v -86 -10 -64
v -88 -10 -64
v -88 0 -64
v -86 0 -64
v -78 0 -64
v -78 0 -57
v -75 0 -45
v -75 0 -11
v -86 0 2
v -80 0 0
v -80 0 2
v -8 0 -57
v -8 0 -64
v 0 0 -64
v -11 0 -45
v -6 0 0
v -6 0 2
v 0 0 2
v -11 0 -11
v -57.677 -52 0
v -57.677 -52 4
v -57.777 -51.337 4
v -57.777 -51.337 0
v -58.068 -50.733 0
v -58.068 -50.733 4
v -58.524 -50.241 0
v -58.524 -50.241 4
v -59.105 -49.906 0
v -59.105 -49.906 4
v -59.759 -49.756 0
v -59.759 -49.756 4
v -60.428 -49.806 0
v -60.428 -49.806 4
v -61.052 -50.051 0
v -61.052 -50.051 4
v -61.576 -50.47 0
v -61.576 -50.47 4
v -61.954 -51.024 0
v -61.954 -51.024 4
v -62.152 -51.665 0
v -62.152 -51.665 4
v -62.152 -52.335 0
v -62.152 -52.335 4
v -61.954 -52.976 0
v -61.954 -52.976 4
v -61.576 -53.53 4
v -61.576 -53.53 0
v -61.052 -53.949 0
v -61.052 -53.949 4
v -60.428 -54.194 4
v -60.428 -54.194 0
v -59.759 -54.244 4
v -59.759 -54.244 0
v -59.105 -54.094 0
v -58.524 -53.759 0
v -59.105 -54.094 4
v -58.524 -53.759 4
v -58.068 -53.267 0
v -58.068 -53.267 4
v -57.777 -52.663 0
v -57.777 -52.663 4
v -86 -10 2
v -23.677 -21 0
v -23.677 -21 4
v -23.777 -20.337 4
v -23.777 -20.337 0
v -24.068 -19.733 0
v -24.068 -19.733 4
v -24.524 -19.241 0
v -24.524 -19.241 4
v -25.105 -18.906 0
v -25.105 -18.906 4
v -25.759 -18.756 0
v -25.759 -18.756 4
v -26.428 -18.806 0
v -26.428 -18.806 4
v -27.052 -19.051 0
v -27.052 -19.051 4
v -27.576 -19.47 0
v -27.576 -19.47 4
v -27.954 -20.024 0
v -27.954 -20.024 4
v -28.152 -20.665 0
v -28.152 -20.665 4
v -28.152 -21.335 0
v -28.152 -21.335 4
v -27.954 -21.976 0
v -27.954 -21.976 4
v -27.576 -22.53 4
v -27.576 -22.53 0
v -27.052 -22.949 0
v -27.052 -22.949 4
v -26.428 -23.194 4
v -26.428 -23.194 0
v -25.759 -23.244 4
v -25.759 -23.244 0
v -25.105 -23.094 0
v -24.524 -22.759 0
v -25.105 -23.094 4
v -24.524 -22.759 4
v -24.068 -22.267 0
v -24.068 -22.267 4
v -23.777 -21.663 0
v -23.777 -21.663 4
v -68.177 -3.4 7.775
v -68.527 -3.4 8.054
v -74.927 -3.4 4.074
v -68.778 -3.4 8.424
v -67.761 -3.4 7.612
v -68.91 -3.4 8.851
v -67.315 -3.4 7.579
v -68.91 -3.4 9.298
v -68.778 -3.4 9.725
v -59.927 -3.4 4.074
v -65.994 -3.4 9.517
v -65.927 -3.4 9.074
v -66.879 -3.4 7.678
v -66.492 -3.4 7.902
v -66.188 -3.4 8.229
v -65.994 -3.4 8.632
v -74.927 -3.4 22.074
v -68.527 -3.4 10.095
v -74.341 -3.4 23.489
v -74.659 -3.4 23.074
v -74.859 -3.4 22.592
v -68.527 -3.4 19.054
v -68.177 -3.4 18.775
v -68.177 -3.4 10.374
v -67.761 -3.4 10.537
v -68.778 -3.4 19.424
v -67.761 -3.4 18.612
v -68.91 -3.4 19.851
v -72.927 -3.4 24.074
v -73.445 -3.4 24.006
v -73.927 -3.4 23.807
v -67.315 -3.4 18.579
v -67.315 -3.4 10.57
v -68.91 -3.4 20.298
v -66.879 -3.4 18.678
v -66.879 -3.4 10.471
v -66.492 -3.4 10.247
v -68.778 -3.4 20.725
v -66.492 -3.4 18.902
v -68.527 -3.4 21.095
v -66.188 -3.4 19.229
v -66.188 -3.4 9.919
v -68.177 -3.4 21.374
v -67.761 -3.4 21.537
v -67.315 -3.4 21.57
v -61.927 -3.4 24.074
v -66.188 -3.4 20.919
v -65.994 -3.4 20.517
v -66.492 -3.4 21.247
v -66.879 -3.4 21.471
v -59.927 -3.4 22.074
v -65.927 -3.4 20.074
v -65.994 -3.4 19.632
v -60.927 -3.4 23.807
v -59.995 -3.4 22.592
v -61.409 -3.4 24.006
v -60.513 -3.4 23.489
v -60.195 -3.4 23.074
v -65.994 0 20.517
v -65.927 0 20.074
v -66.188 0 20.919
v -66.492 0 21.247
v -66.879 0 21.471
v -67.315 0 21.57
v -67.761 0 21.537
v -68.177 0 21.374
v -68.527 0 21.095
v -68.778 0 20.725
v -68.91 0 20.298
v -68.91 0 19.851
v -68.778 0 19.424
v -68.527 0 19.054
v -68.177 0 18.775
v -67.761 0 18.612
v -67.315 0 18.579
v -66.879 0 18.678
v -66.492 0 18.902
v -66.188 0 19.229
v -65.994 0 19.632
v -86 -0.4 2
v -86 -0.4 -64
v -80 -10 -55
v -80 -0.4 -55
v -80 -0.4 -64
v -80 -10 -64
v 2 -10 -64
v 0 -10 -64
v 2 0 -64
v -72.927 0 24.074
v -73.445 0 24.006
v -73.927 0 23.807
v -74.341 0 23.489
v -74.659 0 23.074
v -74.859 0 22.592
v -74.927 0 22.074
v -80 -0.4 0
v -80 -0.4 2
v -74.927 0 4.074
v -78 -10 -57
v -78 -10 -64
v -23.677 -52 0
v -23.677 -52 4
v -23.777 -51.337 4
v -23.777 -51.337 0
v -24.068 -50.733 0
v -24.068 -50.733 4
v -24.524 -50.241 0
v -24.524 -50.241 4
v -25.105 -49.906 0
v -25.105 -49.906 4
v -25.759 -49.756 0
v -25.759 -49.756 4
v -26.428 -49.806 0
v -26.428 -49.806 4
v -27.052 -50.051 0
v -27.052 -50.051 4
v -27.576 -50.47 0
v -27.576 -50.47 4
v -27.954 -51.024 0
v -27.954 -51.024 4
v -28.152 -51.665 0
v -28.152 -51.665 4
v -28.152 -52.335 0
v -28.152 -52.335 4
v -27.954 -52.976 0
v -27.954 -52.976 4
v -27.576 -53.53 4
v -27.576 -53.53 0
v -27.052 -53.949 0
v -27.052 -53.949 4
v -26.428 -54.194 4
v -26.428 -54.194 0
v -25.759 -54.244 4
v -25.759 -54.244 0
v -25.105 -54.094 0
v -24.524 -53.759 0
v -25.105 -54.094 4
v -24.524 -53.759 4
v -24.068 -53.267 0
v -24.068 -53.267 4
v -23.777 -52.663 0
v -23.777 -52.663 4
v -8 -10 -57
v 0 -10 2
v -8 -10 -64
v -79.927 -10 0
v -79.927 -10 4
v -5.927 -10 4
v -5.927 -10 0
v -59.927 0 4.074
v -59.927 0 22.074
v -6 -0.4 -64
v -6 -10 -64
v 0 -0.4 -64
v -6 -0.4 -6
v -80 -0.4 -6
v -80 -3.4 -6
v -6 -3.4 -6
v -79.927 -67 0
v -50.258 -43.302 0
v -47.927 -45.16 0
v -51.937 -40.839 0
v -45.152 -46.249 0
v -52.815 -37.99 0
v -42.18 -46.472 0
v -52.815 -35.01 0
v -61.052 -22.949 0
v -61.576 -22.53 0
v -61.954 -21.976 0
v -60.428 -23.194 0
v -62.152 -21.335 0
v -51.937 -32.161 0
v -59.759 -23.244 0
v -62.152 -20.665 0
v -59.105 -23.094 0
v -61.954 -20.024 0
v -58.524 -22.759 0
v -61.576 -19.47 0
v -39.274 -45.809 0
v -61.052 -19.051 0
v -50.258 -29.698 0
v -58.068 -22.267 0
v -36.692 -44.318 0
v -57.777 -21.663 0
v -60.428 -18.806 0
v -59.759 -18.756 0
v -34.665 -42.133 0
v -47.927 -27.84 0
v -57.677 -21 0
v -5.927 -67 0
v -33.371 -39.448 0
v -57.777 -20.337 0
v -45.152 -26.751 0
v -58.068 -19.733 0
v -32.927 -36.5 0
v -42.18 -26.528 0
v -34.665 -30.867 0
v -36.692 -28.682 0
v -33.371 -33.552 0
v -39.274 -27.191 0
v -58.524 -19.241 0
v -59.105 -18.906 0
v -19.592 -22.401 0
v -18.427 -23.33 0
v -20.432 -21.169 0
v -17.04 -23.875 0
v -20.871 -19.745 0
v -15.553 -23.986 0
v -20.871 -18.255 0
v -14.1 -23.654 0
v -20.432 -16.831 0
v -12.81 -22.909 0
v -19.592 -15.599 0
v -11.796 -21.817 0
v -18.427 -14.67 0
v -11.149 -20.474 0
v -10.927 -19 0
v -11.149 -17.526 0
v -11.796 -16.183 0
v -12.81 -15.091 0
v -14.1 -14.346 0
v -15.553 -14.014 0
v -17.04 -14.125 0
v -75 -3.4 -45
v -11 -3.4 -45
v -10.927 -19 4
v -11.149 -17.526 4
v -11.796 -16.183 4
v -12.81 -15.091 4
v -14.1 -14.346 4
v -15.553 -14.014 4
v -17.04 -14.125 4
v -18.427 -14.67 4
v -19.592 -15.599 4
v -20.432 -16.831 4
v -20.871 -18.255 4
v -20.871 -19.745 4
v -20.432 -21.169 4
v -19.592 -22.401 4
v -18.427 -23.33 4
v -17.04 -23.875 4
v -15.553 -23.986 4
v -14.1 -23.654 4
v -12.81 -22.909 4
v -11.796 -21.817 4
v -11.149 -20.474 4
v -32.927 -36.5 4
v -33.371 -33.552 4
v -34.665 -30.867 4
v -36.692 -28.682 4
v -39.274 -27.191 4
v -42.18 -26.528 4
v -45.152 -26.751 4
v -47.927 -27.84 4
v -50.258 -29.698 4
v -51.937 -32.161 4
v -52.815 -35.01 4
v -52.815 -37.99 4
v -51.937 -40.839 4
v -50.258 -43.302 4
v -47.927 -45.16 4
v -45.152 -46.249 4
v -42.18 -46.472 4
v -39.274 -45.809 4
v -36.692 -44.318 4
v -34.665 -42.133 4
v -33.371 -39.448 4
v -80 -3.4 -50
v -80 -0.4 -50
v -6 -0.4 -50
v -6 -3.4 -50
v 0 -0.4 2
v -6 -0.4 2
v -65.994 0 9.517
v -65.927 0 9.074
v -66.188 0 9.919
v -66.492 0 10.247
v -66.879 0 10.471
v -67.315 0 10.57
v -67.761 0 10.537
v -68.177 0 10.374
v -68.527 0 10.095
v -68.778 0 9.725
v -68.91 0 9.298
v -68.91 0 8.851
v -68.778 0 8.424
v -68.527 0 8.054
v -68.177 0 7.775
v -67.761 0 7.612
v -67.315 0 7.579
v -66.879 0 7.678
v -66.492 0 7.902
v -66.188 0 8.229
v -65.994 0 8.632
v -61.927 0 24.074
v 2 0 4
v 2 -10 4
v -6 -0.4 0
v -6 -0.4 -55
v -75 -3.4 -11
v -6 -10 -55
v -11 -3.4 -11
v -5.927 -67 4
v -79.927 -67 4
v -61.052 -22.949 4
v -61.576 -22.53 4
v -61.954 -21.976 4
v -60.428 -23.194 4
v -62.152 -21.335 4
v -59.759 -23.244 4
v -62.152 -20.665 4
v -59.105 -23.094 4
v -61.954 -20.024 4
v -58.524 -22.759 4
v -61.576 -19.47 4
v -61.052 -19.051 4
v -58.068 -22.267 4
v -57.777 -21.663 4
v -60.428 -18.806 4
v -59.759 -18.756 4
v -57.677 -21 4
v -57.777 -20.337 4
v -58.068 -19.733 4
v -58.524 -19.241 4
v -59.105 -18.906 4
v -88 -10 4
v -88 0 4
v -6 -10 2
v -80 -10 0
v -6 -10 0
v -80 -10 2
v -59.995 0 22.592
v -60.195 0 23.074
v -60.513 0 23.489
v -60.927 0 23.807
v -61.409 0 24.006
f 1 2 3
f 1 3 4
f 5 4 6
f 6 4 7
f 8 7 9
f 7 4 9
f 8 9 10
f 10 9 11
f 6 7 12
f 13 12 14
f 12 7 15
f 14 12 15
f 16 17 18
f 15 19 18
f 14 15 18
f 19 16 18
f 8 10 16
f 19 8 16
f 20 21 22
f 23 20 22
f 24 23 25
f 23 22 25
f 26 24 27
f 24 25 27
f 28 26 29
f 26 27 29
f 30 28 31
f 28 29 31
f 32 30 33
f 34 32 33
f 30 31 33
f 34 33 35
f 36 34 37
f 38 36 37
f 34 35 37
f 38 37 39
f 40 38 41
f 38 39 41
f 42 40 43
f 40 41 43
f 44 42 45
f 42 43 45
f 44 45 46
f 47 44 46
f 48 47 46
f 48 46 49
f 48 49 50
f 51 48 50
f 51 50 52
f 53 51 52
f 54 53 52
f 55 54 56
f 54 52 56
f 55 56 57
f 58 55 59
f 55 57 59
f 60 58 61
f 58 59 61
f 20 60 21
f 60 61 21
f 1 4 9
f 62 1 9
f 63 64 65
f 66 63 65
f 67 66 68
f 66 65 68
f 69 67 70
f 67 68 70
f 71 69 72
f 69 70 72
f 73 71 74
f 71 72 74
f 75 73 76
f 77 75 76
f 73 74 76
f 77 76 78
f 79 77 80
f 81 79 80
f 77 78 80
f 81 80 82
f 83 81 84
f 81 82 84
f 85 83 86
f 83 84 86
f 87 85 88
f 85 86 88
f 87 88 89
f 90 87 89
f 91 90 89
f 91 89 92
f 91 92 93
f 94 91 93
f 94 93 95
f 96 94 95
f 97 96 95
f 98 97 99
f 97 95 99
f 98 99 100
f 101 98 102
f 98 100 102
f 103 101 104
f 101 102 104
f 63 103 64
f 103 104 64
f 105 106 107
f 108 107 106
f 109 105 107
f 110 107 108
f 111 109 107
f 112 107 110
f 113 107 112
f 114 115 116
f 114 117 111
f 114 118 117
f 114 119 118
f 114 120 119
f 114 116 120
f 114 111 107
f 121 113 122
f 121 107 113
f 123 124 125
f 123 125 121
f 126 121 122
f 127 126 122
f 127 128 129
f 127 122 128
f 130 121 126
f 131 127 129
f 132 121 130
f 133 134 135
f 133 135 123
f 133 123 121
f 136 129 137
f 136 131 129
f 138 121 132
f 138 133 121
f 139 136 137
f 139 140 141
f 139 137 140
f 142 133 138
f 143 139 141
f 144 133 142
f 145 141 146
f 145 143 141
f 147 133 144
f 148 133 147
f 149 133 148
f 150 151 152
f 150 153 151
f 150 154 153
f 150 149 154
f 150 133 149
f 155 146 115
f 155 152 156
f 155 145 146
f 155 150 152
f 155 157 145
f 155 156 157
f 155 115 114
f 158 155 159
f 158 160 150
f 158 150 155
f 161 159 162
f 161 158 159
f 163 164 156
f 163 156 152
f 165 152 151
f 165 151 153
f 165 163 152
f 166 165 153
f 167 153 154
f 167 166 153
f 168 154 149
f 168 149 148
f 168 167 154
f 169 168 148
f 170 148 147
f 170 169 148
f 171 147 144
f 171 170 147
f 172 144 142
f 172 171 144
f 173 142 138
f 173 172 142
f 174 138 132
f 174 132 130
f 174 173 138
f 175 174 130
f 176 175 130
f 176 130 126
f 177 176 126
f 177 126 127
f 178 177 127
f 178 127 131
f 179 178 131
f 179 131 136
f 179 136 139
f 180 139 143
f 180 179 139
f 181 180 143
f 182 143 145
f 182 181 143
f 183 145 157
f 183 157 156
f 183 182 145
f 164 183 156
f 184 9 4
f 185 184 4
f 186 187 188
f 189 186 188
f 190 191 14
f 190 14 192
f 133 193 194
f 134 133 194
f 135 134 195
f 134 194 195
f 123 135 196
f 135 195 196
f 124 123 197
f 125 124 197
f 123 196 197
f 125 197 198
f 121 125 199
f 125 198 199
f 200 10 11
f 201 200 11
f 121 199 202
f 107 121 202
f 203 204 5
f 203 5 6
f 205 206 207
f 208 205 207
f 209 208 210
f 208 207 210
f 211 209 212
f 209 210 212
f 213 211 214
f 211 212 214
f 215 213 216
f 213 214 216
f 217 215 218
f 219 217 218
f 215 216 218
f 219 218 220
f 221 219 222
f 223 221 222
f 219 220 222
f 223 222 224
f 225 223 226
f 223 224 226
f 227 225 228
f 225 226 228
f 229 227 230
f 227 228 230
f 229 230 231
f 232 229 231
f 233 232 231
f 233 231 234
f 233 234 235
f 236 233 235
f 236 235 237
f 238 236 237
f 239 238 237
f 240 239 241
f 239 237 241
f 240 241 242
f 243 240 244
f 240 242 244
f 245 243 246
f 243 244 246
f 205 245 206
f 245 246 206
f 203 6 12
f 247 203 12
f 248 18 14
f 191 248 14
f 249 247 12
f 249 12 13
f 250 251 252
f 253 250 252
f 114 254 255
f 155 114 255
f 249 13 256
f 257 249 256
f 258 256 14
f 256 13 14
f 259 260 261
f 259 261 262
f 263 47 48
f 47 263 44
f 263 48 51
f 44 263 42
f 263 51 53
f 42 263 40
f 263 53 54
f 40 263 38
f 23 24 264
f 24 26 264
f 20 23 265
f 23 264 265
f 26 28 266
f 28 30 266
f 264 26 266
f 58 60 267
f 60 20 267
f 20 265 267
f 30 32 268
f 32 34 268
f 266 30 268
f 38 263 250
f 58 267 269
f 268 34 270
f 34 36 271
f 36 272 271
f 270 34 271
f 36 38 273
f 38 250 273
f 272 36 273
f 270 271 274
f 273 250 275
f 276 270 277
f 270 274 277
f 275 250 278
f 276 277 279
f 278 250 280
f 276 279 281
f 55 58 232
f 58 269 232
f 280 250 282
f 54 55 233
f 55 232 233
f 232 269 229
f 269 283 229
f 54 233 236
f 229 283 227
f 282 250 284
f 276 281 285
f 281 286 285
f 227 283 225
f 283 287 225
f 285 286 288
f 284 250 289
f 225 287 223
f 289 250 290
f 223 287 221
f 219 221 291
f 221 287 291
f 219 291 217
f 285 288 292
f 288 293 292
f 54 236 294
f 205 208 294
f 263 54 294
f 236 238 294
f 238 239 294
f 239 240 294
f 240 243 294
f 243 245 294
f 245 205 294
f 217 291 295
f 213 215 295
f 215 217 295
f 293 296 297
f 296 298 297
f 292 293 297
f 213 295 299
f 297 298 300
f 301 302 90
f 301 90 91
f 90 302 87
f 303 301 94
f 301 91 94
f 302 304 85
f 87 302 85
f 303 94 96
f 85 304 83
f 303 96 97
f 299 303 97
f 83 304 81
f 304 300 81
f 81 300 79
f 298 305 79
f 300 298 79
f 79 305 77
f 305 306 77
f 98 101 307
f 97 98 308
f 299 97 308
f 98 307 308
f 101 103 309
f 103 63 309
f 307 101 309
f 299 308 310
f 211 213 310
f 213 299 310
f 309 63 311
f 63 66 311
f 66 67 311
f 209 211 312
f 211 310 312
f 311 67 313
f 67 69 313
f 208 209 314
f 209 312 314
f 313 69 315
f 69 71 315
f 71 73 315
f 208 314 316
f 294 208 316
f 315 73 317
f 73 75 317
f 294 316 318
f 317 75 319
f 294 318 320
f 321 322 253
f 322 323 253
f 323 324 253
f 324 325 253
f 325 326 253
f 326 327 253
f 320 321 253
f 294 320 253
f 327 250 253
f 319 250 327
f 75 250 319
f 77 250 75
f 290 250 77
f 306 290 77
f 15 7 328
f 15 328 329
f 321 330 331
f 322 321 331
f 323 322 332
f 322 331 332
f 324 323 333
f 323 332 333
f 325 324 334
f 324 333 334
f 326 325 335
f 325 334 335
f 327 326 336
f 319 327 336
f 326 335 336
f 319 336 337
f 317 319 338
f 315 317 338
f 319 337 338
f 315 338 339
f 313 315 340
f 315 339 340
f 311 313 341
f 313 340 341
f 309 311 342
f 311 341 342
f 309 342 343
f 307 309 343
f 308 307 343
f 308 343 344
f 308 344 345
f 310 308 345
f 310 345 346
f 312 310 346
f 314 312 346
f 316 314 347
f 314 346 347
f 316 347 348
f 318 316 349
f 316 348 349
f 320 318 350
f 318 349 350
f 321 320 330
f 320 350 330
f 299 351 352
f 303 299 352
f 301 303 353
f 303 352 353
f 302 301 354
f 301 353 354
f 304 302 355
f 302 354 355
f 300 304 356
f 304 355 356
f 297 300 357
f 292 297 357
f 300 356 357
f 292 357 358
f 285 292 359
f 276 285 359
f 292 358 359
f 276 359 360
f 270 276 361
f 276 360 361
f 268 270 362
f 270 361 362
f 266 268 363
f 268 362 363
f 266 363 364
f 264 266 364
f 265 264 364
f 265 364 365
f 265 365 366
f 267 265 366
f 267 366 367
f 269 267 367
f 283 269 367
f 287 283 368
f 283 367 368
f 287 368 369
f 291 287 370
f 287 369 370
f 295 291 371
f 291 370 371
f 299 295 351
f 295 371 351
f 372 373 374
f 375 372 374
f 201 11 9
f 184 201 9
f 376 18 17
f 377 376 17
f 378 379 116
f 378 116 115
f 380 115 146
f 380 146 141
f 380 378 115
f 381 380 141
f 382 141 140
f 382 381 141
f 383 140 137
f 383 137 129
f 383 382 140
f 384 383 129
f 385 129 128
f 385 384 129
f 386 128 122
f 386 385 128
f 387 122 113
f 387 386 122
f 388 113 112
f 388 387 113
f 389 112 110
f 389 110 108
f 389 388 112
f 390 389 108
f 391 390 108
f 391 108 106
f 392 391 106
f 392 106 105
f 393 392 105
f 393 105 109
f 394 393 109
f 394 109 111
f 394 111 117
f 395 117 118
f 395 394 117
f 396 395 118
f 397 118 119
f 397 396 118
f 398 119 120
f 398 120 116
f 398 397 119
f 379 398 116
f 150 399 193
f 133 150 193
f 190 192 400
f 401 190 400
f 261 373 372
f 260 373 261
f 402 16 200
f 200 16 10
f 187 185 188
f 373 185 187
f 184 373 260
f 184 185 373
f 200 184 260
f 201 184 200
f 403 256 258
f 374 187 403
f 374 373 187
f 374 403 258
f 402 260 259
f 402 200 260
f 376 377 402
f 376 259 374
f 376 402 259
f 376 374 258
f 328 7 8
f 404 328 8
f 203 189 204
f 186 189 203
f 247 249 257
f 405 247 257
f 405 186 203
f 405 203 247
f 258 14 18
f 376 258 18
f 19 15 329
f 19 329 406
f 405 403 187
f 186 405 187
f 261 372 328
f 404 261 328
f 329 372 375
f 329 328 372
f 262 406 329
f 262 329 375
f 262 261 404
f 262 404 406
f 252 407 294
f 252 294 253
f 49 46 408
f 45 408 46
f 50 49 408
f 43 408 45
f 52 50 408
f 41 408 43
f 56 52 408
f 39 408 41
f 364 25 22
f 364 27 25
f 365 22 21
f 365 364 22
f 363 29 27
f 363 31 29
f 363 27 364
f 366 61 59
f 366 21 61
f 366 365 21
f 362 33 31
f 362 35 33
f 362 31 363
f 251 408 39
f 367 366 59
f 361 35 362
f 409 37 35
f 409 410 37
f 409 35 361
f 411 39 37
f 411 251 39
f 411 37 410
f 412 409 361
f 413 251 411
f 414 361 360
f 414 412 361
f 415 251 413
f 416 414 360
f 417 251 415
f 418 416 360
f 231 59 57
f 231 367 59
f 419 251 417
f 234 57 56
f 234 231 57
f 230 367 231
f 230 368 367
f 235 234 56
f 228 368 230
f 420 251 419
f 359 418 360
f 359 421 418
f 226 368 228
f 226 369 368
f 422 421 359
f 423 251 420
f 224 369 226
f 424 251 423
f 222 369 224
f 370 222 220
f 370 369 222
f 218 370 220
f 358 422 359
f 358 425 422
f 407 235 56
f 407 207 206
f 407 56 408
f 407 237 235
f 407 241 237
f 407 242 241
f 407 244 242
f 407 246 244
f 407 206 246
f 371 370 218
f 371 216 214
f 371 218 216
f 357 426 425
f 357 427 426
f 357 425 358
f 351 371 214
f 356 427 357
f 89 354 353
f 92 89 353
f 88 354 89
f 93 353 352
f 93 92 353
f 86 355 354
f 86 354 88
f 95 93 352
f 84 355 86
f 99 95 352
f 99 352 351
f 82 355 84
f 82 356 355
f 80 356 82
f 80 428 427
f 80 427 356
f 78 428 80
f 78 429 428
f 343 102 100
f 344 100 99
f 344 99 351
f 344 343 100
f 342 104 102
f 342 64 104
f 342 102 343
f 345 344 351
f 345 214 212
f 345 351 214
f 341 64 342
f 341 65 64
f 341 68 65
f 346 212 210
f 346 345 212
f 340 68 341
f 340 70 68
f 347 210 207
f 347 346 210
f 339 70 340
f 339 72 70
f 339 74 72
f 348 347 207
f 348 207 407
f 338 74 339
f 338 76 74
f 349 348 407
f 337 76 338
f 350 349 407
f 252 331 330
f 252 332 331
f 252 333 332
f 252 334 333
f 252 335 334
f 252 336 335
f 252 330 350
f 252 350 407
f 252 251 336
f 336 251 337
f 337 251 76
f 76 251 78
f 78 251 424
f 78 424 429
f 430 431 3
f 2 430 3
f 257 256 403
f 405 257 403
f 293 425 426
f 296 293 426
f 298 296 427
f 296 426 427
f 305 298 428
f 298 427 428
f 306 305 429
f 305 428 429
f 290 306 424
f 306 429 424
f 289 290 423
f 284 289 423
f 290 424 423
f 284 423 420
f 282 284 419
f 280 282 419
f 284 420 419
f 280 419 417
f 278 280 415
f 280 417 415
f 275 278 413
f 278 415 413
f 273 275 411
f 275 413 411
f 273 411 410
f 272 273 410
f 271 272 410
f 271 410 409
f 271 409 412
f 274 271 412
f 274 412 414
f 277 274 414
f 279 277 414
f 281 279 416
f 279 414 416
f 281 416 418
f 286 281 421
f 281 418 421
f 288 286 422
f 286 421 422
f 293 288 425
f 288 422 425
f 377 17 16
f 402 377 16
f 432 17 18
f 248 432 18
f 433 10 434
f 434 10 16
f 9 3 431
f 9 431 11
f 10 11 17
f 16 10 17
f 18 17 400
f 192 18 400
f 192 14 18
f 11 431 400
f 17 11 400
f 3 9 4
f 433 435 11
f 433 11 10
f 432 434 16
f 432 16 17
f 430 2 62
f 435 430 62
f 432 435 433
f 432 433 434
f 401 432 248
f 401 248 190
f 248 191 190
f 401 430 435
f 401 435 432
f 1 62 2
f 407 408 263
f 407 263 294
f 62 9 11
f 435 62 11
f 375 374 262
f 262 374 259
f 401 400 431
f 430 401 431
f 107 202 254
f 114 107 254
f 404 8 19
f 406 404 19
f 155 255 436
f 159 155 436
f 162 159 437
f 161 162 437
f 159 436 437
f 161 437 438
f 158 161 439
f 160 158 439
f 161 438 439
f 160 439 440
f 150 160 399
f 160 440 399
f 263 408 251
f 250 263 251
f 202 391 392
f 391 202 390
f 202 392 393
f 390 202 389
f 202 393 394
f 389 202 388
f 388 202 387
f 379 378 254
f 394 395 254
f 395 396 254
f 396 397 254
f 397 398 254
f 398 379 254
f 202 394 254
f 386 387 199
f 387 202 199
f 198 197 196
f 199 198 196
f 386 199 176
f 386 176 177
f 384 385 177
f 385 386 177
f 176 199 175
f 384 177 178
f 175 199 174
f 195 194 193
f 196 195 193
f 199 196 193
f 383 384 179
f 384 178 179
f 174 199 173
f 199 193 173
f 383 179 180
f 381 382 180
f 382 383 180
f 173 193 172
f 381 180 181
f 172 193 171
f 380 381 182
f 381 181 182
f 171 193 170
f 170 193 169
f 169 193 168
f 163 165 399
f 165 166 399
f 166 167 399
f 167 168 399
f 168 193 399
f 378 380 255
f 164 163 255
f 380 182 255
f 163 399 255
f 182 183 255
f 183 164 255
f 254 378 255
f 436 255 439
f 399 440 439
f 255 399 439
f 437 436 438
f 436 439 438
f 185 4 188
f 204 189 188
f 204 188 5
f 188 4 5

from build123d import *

# Parameters (mm, degrees)
F2_DEPTH = 10
F4_W     = 74
F4_H     = 57
F4_R     = 2.25
F4_R_2   = 10
F4_R_3   = 5
F5_DEPTH = 4
F0_W     = 74
F0_H     = 44
F6_DEPTH = 0.4
F0_W_2   = 64
F0_H_2   = 34
F7_DEPTH = 3.4
F8_R     = 1.5
F9_DEPTH = 3.4


with BuildPart() as f2:
    # F0 (on Front) → F2 (new body)
    with BuildSketch(Plane.XZ):
        Polygon((0, 2), (0, -64), (2, -64), (2, 4), (-88, 4), (-88, -64), (-86, -64), (-86, 2), (-80, 2), (-80, 0), (-6, 0), (-6, 2), align=None)
    extrude(amount=F2_DEPTH)


with BuildPart() as f2b:
    # F0 (on Front) → F2, piece 2 (new body)
    with BuildSketch(Plane.XZ):
        Polygon((-6, -64), (-6, -55), (-80, -55), (-80, -64), (-78, -64), (-78, -57), (-8, -57), (-8, -64), align=None)
    extrude(amount=F2_DEPTH)

    # F0 (on Front) → F6 (join)
    with BuildSketch(Plane.XZ):
        Polygon((-80, -55), (-6, -55), (-6, -64), (0, -64), (0, 2), (-6, 2), (-6, 0), (-80, 0), (-80, 2), (-86, 2), (-86, -64), (-80, -64), align=None)
        with Locations((-43, -28)):
            Rectangle(F0_W, F0_H, mode=Mode.SUBTRACT)
    extrude(amount=F6_DEPTH)

    # F0 (on Front) → F7 (join)
    with BuildSketch(Plane.XZ):
        with Locations((-43, -28)):
            Rectangle(F0_W, F0_H)
        with Locations((-43, -28)):
            Rectangle(F0_W_2, F0_H_2, mode=Mode.SUBTRACT)
    extrude(amount=F7_DEPTH)


with BuildPart() as f5:
    # F4 (on face) → F5 (new body, through all)
    with BuildSketch(Plane.XY.offset(4)):
        with Locations((-42.927035287, -38.5)):
            Rectangle(F4_W, F4_H)
        with Locations((-59.927035287, -52)):
            Circle(F4_R, mode=Mode.SUBTRACT)
        with Locations((-25.927035287, -52)):
            Circle(F4_R, mode=Mode.SUBTRACT)
        with Locations((-42.927035287, -36.5)):
            Circle(F4_R_2, mode=Mode.SUBTRACT)
        with Locations((-59.927035287, -21)):
            Circle(F4_R, mode=Mode.SUBTRACT)
        with Locations((-25.927035287, -21)):
            Circle(F4_R, mode=Mode.SUBTRACT)
        with Locations((-15.927035287, -19)):
            Circle(F4_R_3, mode=Mode.SUBTRACT)
    extrude(amount=-F5_DEPTH)


with BuildPart() as f9:
    # F8 (on Front) → F9 (new body)
    with BuildSketch(Plane.XZ):
        with BuildLine():
            Line((-74.927035287, 4.0744631551), (-59.927035287, 4.0744631551))
            Line((-59.927035287, 4.0744631551), (-59.927035287, 22.0744631551))
            ThreePointArc((-59.927035287, 22.0744631551), (-60.5128217246, 23.4886767175), (-61.927035287, 24.0744631551))
            Line((-61.927035287, 24.0744631551), (-72.927035287, 24.0744631551))
            ThreePointArc((-72.927035287, 24.0744631551), (-74.3412488494, 23.4886767175), (-74.927035287, 22.0744631551))
            Line((-74.927035287, 22.0744631551), (-74.927035287, 4.0744631551))
        make_face()
        with Locations((-67.427035287, 9.0744631551)):
            Circle(F8_R, mode=Mode.SUBTRACT)
        with Locations((-67.427035287, 20.0744631551)):
            Circle(F8_R, mode=Mode.SUBTRACT)
    extrude(amount=F9_DEPTH)


solid = Compound([f2.part, f2b.part, f5.part, f9.part])
